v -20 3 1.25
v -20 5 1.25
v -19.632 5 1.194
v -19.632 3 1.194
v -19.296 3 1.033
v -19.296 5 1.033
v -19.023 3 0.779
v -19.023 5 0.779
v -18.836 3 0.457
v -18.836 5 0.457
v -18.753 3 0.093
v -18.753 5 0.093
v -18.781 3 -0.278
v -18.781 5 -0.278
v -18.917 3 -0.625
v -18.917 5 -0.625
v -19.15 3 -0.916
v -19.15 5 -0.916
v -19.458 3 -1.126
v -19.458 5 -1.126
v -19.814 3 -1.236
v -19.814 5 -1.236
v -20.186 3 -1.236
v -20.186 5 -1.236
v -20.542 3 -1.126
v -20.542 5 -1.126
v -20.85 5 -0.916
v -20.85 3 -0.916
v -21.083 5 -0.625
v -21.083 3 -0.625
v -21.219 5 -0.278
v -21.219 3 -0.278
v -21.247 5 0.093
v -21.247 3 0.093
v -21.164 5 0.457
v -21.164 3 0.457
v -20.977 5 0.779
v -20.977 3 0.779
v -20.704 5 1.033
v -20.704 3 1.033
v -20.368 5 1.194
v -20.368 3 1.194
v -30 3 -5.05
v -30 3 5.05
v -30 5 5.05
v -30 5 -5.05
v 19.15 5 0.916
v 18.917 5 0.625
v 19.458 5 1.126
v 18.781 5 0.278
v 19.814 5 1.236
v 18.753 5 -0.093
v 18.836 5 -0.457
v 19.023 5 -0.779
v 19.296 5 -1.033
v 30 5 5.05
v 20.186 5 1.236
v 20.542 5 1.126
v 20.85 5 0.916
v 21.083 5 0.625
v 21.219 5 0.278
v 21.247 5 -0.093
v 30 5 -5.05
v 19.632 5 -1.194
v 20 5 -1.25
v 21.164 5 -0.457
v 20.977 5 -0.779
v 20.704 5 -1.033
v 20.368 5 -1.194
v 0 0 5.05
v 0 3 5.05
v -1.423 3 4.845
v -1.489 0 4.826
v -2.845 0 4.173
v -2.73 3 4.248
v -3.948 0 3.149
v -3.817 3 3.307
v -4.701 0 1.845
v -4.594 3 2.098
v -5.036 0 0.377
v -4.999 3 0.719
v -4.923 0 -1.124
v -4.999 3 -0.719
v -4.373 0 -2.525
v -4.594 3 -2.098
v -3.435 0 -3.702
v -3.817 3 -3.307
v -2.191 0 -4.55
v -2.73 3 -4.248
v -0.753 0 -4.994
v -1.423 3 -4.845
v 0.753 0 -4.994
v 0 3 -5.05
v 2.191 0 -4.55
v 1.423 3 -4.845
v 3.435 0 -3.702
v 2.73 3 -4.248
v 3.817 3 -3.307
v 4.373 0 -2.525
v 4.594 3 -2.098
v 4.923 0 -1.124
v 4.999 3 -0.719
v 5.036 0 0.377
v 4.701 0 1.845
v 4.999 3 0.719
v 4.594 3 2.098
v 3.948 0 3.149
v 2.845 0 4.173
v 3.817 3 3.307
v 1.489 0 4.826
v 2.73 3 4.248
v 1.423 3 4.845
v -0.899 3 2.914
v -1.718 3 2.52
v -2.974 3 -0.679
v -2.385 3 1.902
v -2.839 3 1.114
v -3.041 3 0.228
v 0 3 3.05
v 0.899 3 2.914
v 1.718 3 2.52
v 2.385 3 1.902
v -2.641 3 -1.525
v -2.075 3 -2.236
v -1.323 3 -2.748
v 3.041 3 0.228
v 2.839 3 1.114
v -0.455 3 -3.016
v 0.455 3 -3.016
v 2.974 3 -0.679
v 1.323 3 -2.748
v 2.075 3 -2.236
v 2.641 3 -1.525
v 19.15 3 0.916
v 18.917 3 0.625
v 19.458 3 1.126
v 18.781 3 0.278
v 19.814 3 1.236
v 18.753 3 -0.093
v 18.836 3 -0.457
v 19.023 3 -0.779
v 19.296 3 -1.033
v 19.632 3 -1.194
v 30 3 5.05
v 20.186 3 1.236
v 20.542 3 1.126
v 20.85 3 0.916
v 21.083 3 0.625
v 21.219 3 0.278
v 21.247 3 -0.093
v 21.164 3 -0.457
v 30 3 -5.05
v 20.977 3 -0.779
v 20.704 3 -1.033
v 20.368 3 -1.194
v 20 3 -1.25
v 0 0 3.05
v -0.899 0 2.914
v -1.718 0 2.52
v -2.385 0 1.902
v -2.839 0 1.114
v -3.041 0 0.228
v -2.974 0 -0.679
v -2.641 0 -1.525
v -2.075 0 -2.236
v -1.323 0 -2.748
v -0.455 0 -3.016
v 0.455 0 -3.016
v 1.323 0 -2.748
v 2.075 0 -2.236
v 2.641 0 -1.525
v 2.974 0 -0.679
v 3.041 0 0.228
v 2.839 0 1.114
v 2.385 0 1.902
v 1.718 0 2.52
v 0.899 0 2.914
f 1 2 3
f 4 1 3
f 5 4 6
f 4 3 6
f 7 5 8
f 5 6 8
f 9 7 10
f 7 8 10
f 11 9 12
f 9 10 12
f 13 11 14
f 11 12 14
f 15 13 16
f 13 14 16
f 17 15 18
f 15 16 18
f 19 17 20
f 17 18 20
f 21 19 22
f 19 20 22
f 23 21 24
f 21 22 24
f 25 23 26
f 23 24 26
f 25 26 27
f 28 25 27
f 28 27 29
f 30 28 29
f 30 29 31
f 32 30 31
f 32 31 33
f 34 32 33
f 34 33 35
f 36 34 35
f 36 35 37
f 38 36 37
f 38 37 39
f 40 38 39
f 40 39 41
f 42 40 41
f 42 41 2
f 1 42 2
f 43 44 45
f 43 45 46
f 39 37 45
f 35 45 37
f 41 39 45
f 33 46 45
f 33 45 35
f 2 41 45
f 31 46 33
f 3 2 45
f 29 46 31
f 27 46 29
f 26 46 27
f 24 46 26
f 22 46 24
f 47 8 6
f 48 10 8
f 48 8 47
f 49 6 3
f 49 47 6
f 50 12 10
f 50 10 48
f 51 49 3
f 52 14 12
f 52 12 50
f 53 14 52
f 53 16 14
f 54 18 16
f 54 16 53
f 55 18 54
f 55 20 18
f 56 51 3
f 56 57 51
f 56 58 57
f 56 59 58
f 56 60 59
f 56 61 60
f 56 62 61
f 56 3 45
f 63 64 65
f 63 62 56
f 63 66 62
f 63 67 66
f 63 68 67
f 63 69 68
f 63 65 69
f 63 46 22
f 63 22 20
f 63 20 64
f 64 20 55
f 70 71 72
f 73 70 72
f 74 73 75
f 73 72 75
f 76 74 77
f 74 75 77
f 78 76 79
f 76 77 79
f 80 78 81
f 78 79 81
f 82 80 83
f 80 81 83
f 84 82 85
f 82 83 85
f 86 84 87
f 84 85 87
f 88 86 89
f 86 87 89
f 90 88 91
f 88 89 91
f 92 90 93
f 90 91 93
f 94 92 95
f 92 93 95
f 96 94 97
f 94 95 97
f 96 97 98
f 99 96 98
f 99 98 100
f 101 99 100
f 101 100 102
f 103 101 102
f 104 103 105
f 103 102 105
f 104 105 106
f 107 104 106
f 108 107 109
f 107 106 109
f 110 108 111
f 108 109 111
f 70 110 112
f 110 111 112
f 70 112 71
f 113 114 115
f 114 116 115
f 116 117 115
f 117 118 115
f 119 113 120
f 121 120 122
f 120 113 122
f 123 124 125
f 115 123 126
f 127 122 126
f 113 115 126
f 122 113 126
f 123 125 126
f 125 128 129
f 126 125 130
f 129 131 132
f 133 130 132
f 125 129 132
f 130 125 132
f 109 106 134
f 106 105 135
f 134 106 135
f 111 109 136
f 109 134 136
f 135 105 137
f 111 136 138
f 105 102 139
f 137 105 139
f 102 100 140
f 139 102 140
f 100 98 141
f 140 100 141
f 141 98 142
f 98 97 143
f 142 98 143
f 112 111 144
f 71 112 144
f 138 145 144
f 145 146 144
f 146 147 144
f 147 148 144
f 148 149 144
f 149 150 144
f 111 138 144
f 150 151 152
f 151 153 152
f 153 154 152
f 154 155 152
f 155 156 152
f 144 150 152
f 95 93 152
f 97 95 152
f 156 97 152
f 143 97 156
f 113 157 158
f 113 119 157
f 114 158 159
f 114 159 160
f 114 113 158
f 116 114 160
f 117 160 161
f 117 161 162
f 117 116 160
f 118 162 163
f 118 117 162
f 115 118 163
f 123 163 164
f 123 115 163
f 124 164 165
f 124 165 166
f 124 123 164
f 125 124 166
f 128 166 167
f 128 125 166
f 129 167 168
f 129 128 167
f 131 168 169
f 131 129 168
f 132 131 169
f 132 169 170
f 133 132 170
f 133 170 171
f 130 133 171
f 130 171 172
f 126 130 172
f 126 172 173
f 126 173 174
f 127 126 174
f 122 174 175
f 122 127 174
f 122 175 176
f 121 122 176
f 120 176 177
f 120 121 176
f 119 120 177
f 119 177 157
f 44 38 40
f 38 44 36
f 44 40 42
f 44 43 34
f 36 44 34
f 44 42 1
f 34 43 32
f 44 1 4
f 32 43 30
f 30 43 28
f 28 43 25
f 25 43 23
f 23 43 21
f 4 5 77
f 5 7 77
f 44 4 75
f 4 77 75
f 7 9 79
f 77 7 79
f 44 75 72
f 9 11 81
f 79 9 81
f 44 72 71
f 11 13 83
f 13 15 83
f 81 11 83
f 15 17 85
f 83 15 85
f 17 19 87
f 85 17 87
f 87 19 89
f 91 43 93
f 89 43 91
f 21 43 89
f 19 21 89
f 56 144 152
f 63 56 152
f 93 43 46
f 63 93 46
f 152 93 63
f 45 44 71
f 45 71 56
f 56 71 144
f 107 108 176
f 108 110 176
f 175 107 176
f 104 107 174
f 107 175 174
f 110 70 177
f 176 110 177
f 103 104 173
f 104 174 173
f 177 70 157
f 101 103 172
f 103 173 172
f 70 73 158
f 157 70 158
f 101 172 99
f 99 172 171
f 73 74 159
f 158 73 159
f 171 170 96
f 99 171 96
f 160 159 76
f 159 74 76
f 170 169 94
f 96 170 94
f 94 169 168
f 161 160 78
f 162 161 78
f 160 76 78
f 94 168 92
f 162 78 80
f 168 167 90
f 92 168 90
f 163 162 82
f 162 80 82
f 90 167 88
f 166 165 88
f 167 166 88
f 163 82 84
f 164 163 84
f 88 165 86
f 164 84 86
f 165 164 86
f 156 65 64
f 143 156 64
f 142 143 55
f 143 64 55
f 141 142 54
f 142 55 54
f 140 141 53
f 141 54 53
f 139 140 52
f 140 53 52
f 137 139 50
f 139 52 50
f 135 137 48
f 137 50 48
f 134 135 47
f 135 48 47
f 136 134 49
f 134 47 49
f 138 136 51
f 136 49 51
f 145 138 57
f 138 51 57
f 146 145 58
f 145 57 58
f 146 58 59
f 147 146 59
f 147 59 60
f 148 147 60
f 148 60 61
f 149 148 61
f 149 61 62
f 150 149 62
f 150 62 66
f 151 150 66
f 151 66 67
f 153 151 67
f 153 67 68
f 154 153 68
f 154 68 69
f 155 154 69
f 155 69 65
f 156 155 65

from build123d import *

# Parameters (mm, degrees)
SKETCH1_W           = 2
SKETCH1_H           = 3
SKETCH2_W           = 60
SKETCH2_H           = 10.1
BOSS_EXTRUDE1_DEPTH = 2
SKETCH3_R           = 1.25
CUT_EXTRUDE1_DEPTH  = 5


with BuildPart() as part:
    # Sketch1 → Revolve1 (revolve)
    with BuildSketch(Plane.XY, mode=Mode.PRIVATE) as revolve1_sk:
        with Locations((4.05, 1.5)):
            Rectangle(SKETCH1_W, SKETCH1_H)
    revolve(revolve1_sk.sketch.rotate(Axis((0, 97.022326023, 0), (0, -1, 0)), 90), axis=Axis((0, 97.022326023, 0), (0, -1, 0)))

    # Sketch2 → Boss-Extrude1 (add)
    with BuildSketch(Plane(origin=(0, 3, 0), x_dir=(1, 0, 0), z_dir=(0, 1, 0))):
        Rectangle(SKETCH2_W, SKETCH2_H)
    extrude(amount=BOSS_EXTRUDE1_DEPTH)

    # Sketch3 → Cut-Extrude1 (cut)
    with BuildSketch(Plane(origin=(0, 5, 0), x_dir=(1, 0, 0), z_dir=(0, 1, 0))):
        with Locations(Location((-20, 0, 0), (0, 0, 270))):
            Circle(SKETCH3_R)
        with Locations(Location((20, 0, 0), (0, 0, 90))):
            Circle(SKETCH3_R)
    extrude(amount=-CUT_EXTRUDE1_DEPTH, mode=Mode.SUBTRACT)


solid = part.part
